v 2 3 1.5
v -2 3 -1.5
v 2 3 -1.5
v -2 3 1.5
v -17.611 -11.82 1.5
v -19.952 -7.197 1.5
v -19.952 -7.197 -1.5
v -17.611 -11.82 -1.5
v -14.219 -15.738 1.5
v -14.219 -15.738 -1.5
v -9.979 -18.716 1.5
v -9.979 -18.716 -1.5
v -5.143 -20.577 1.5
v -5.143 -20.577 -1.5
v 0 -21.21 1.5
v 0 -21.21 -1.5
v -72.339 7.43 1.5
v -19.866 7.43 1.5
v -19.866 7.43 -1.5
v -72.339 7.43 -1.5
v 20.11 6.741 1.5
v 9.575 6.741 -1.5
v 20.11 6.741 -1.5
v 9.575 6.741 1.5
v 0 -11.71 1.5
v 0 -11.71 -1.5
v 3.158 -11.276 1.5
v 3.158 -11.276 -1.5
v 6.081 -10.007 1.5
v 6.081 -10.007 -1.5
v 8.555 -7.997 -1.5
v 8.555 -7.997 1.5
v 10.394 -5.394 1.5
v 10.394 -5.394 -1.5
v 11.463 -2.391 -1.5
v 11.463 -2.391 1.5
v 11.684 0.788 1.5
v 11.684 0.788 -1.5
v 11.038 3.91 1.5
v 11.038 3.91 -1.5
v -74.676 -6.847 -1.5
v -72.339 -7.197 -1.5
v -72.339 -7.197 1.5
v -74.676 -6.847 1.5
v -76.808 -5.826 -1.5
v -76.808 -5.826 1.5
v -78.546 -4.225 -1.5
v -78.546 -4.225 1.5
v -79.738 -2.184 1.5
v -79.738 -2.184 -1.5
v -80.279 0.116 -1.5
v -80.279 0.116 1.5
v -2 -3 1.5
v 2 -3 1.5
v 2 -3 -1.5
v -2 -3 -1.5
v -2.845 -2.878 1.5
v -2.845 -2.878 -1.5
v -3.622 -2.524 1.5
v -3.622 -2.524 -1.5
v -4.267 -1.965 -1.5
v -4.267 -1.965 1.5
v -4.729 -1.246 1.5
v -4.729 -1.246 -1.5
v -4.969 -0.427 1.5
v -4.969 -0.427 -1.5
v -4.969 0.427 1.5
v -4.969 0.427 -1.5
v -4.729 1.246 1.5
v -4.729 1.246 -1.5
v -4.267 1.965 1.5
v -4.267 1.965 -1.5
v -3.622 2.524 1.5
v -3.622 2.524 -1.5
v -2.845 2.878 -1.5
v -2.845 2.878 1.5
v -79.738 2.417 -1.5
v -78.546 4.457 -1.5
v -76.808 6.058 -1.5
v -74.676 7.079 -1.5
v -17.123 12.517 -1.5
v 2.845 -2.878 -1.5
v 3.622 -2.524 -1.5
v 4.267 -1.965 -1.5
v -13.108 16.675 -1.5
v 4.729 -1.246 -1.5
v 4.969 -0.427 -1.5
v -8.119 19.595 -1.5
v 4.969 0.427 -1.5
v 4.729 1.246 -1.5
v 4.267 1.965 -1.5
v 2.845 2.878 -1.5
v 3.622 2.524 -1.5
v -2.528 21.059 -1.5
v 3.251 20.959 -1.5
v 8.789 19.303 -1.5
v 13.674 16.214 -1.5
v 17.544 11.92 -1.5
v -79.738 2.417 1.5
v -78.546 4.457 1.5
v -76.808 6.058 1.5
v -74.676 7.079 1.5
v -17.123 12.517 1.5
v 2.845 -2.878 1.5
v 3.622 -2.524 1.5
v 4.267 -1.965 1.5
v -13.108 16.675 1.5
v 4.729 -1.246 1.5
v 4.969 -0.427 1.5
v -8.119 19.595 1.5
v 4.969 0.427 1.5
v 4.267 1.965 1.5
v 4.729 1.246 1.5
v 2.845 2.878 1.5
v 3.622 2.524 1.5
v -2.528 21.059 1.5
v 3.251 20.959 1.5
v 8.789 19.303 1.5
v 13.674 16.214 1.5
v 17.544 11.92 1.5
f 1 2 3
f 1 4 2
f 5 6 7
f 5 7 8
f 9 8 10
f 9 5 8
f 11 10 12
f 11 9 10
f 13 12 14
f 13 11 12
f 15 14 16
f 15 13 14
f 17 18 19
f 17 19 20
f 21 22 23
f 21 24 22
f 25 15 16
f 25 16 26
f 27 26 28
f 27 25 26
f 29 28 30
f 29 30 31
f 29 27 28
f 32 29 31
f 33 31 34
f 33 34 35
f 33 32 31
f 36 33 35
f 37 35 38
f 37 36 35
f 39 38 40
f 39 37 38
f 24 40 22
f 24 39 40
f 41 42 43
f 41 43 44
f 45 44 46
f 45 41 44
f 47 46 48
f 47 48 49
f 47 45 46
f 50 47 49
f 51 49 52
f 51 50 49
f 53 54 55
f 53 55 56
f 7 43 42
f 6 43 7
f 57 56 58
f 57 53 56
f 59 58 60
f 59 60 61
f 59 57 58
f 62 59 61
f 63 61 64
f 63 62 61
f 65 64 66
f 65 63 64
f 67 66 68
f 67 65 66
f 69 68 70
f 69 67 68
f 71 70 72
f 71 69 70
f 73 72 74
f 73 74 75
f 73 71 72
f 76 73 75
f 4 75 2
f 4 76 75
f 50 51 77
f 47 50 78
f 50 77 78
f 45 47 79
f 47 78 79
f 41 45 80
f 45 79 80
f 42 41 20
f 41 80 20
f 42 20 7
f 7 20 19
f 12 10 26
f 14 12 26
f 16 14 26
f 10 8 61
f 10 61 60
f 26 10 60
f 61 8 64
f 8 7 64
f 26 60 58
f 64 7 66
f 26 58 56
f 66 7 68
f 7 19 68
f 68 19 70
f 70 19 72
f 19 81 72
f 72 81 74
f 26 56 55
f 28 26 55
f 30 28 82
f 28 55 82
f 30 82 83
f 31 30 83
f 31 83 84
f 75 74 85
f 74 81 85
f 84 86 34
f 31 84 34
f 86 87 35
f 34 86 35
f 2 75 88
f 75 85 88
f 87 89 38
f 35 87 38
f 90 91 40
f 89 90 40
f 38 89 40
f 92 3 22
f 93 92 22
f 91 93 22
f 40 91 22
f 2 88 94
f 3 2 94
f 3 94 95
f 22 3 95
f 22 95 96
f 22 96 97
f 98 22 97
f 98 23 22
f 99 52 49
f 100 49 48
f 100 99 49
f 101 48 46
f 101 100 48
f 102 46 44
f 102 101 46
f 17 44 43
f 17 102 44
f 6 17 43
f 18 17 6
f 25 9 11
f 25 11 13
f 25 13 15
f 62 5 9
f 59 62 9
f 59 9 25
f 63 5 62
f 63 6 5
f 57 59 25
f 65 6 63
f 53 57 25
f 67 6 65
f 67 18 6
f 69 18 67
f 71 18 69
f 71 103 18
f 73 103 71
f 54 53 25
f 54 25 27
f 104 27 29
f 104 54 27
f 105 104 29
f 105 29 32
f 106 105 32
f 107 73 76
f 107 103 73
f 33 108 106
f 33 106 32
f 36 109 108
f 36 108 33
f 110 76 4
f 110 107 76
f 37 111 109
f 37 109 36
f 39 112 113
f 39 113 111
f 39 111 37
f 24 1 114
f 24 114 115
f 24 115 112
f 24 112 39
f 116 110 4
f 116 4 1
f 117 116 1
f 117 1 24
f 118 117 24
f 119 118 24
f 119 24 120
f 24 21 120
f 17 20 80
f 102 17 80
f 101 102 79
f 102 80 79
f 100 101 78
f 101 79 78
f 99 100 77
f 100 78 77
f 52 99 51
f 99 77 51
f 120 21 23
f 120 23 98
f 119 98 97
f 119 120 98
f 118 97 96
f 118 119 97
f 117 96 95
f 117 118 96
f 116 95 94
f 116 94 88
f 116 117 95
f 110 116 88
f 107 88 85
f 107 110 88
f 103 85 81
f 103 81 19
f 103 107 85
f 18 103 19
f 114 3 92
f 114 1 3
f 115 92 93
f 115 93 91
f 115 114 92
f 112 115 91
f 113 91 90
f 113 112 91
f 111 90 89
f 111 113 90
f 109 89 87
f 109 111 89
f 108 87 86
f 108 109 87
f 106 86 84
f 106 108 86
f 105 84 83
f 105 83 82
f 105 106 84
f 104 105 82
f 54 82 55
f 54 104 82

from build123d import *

# Parameters (mm, degrees)
F1_DEPTH    = 1.5
F3_DEPTH    = 3
F4_T1_DEPTH = 42.8345237792


# Not quite as in the source:
# - a fillet or chamfer that OpenCascade refuses, or shapes differently, is made with other operations: its cross-section is extruded or revolved along the edge and cut away or added


with BuildPart() as f1:
    # F0 (on Top) → F1 (new body, symmetric)
    with BuildSketch(Plane.XY):
        with BuildLine():
            Line((9.5752676601, 6.7411407109), (20.1104327648, 6.7411407109))
            ThreePointArc((20.1104327648, 6.7411407109), (-17.2170469432, 12.3873233035), (0, -21.2101976434))
            Line((0, -21.2101976434), (0, -11.7101976434))
            ThreePointArc((0, -11.7101976434), (10.3939602393, -5.3939150337), (9.5752676601, 6.7411407109))
        make_face()
        with BuildLine():
            Line((2, -3), (-2, -3))
            ThreePointArc((-2, -3), (-5, 0), (-2, 3))
            Line((-2, 3), (2, 3))
            ThreePointArc((2, 3), (5, 0), (2, -3))
        make_face(mode=Mode.SUBTRACT)
    extrude(amount=F1_DEPTH, both=True)

    # F2 (on face) → F3 (join)
    with BuildSketch(Plane.XY.offset(1.5)):
        with BuildLine():
            ThreePointArc((-19.9517186141, -7.19731953), (-21.2098366027, 0.1237552257), (-19.8663731217, 7.4296502651))
            Line((-19.8663731217, 7.4296502651), (-80.3057924461, 7.4296502651))
            Line((-80.3057924461, 7.4296502651), (-80.3057924461, -7.19731953))
            Line((-80.3057924461, -7.19731953), (-19.9517186141, -7.19731953))
        make_face()
    extrude(amount=-F3_DEPTH)

    # F4: fillet of radius 7.9669047558 on 2 edges, made by hand

    # F4_s2 → F4_t1 (cut)
    with BuildSketch(Plane.XY.offset(-21.4172618896)):
        with BuildLine():
            ThreePointArc((-72.3388876903, -7.19731953), (-77.9723400682, -4.863867152), (-80.3057924461, 0.7695852259))
            Line((-80.3057924461, 0.7695852259), (-80.3057924461, -7.19731953))
            Line((-80.3057924461, -7.19731953), (-72.3388876903, -7.19731953))
        make_face()
        with BuildLine():
            ThreePointArc((-72.3388876903, 7.4296502651), (-77.9723400682, 5.0961978872), (-80.3057924461, -0.5372544907))
            Line((-80.3057924461, -0.5372544907), (-80.3057924461, 7.4296502651))
            Line((-80.3057924461, 7.4296502651), (-72.3388876903, 7.4296502651))
        make_face()
    extrude(amount=F4_T1_DEPTH, mode=Mode.SUBTRACT)


solid = f1.part
